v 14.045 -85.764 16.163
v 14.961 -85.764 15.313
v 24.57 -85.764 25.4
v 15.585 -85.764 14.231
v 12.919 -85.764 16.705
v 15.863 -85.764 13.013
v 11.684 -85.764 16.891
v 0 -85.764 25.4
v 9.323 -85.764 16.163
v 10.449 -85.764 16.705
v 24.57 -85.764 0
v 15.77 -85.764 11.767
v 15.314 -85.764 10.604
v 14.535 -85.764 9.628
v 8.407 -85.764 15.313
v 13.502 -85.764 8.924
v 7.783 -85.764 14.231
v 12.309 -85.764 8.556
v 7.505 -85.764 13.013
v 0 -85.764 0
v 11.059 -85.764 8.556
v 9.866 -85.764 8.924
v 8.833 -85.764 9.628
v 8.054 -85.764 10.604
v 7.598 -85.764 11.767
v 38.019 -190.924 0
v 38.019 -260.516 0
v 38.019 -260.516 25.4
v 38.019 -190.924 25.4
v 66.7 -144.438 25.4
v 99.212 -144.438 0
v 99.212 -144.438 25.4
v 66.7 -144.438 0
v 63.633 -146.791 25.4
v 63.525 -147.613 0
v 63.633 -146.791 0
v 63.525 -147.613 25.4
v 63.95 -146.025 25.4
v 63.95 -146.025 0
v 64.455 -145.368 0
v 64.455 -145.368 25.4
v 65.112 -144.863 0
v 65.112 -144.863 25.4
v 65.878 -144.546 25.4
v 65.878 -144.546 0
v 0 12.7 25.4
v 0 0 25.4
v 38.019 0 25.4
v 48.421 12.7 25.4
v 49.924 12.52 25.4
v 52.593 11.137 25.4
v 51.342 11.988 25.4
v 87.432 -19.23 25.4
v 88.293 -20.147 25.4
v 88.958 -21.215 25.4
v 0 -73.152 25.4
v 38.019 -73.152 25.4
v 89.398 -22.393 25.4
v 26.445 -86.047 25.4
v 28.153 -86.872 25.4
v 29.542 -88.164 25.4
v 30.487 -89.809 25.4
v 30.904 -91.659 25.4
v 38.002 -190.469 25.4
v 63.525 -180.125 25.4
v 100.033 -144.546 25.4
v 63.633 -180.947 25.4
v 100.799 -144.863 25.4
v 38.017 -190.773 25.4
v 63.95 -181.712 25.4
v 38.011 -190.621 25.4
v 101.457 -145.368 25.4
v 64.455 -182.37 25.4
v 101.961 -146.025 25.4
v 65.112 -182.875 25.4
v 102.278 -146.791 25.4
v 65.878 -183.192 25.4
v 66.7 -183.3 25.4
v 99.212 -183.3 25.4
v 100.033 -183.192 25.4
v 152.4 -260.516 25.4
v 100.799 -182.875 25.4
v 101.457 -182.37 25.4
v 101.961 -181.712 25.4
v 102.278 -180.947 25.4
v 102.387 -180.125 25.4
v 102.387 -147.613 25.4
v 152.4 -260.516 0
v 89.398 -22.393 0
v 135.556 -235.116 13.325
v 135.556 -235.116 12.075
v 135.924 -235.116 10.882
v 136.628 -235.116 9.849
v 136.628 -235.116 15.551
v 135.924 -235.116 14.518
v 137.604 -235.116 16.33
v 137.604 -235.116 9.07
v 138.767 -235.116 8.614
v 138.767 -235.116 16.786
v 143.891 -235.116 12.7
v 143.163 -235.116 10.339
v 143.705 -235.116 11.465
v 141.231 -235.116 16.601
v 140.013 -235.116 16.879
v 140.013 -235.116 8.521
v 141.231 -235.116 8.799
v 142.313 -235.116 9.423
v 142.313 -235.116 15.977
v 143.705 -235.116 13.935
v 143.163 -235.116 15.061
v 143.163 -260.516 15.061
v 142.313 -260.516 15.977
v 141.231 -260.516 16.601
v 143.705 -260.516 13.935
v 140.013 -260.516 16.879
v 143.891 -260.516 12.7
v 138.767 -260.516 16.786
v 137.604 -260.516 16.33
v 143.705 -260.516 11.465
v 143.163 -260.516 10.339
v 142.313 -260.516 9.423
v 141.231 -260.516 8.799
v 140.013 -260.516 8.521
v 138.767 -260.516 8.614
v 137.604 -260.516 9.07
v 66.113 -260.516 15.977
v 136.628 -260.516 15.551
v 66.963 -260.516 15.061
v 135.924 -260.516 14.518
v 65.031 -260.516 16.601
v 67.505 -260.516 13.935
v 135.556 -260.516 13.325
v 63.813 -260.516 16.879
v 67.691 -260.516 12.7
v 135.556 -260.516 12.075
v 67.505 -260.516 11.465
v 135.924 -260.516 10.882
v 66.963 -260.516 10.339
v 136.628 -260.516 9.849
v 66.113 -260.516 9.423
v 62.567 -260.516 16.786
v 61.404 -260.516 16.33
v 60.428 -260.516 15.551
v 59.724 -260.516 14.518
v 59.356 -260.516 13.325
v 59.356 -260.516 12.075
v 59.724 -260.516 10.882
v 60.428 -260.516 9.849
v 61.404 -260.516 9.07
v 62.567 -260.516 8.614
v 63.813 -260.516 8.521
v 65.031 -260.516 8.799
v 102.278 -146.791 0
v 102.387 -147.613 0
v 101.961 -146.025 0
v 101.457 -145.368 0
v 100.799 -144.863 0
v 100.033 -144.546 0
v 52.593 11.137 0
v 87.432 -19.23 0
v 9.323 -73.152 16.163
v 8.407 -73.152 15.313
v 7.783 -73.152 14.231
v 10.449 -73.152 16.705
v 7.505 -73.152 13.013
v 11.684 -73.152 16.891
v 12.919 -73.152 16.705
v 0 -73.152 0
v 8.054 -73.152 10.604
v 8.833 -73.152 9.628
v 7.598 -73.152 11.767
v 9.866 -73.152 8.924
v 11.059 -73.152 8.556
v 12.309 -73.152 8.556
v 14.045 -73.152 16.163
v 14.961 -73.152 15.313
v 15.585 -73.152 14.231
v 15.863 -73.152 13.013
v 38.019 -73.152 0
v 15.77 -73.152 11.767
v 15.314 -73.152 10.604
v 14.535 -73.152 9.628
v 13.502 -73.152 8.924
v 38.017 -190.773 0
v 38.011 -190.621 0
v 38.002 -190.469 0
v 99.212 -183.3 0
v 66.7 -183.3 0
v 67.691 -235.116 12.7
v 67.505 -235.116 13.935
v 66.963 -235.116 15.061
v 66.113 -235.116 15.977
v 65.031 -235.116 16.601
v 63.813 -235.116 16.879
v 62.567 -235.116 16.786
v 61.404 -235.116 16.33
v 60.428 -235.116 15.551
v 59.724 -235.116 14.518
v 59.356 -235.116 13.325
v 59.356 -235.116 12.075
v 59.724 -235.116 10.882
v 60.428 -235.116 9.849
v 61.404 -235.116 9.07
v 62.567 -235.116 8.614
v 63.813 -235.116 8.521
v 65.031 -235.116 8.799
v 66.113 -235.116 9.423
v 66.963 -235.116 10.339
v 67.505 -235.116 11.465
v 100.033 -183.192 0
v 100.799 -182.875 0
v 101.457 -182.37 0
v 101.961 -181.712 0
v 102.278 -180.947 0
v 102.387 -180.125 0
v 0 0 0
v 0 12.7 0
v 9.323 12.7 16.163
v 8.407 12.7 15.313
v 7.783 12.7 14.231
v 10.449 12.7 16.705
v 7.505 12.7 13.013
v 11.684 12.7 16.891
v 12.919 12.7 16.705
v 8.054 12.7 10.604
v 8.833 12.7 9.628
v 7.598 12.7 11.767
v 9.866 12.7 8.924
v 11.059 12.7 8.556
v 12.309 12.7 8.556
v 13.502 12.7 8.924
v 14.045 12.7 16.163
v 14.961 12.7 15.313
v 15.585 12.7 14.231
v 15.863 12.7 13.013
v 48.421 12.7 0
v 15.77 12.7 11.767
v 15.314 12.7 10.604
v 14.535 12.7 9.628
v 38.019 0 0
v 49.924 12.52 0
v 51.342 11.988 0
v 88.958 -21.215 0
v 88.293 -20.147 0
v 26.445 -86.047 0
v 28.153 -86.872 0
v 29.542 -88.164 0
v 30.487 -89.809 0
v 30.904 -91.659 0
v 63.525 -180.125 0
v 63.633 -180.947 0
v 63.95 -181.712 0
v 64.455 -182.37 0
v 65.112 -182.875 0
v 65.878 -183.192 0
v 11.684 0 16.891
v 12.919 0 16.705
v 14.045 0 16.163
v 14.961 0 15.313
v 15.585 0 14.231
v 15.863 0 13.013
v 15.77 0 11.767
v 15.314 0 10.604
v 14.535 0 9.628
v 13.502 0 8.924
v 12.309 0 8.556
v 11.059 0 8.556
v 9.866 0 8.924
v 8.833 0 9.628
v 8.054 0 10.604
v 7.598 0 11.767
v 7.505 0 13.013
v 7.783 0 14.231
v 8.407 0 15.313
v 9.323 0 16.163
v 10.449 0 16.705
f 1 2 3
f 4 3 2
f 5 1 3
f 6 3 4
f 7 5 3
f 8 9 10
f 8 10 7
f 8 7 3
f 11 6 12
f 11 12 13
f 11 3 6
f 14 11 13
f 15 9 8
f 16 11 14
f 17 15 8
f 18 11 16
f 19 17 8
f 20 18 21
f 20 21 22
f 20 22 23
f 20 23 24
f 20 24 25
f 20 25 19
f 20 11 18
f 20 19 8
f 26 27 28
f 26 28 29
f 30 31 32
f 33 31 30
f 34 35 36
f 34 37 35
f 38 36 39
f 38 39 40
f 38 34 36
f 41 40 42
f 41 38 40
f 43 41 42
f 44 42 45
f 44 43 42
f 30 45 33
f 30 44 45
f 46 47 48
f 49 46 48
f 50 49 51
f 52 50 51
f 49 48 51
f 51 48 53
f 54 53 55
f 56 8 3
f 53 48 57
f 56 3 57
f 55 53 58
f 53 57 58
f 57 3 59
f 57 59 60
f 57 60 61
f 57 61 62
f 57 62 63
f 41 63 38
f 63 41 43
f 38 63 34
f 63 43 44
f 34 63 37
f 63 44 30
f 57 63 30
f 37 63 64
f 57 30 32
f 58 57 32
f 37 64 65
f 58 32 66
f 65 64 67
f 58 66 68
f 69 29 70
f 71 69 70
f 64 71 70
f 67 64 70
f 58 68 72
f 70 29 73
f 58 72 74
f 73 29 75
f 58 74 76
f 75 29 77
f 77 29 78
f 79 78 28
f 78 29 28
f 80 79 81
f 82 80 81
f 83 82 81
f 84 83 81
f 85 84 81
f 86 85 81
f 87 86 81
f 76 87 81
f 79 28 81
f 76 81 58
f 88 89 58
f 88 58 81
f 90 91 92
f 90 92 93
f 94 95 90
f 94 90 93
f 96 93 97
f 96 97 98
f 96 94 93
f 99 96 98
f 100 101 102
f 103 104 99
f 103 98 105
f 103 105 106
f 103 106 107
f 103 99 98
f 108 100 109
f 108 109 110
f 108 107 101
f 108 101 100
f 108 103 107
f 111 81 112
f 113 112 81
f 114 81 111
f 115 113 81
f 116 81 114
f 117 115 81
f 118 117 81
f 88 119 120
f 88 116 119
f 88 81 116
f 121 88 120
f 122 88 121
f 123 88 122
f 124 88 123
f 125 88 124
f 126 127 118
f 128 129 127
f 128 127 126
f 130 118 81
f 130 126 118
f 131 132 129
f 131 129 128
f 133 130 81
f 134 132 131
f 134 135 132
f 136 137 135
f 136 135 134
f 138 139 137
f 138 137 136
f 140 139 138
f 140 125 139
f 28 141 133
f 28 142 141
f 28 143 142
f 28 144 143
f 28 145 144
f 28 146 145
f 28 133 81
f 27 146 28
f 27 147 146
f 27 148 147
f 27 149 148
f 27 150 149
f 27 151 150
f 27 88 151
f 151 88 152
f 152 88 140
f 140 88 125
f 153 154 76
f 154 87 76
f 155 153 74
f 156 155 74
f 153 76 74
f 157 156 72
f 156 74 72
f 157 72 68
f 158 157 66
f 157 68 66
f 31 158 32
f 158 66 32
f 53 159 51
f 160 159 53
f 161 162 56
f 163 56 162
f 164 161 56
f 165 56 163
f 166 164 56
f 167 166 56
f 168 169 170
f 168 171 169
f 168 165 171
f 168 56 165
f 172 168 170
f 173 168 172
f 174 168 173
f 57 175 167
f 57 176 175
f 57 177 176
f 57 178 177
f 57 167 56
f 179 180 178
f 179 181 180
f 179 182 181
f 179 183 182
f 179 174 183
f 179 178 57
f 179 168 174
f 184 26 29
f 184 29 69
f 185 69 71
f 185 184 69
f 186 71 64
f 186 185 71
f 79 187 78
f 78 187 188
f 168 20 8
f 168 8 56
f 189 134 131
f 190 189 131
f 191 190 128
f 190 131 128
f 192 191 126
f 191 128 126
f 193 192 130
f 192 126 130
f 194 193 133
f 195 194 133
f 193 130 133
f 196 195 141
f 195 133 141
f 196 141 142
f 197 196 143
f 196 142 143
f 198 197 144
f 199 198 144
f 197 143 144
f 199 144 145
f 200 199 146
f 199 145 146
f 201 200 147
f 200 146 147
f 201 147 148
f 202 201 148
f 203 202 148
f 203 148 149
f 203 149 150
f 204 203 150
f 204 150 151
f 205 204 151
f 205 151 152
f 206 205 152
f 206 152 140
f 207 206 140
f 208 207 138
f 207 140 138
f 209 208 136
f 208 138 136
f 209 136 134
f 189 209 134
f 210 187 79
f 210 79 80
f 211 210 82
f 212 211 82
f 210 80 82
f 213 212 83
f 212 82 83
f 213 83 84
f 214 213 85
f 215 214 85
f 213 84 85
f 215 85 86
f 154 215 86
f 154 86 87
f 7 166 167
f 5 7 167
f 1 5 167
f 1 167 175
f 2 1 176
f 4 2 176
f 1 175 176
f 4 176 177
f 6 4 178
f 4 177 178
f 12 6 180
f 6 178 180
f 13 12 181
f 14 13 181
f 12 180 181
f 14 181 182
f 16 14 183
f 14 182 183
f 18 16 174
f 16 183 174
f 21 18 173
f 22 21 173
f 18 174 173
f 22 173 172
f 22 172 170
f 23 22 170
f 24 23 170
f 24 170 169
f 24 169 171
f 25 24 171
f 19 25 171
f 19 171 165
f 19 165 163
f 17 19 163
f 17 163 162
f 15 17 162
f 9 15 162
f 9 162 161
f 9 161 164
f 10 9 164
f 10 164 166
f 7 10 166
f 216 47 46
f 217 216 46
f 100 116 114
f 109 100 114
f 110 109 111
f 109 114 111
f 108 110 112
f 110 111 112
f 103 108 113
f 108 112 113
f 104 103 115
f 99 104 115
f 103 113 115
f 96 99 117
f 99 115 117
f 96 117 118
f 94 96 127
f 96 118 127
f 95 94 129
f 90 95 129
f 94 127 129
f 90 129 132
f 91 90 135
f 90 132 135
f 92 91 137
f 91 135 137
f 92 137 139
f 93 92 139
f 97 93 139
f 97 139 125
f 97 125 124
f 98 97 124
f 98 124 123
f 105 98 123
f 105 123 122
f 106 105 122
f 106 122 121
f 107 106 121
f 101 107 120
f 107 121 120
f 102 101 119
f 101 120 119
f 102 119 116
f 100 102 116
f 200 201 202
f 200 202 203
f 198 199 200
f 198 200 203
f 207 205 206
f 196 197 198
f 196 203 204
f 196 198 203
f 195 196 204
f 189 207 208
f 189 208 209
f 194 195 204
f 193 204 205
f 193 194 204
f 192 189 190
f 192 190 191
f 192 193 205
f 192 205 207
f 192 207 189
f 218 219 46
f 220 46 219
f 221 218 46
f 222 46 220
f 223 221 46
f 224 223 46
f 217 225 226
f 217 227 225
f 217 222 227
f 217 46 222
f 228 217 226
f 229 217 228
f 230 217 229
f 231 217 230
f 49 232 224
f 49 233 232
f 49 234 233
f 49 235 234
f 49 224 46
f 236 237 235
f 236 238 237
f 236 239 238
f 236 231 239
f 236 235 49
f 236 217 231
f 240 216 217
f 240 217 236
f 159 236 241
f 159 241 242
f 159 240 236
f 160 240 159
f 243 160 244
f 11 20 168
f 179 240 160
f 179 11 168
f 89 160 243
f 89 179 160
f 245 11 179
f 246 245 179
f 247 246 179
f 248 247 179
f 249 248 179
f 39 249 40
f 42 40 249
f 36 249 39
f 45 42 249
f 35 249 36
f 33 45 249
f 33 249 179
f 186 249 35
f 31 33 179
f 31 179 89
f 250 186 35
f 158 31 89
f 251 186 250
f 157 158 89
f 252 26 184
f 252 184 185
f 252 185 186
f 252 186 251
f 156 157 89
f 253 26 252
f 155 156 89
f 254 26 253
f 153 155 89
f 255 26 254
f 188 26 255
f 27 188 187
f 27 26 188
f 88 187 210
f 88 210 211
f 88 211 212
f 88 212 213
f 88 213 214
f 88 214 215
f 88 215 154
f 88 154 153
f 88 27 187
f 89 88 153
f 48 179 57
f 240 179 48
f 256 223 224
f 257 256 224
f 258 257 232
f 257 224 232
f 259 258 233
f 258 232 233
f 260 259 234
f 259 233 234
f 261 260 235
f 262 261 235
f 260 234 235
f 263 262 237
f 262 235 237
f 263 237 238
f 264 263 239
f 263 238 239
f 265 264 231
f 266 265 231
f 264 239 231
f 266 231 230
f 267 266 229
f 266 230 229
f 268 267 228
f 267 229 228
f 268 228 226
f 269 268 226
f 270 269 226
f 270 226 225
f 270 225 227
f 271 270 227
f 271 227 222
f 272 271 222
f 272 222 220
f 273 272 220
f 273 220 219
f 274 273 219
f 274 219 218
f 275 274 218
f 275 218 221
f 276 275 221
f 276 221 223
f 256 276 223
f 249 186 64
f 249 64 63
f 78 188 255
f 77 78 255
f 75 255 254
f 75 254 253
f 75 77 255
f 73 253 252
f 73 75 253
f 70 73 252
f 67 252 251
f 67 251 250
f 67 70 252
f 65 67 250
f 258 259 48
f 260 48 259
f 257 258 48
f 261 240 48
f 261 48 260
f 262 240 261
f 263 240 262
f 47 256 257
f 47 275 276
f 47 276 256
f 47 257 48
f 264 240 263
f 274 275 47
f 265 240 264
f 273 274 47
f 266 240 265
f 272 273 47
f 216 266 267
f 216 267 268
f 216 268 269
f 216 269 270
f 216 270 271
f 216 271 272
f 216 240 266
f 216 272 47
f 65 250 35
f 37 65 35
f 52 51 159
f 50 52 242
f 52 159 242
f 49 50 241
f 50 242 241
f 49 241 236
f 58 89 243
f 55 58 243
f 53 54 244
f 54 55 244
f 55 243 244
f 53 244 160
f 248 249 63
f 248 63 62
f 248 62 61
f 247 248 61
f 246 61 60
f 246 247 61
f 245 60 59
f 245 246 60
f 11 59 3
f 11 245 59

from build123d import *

# Parameters (mm, degrees)
BOSS_EXTRUDE1_DEPTH = 25.4
SKETCH2_W           = 38.862
SKETCH2_H           = 38.862
CUT_EXTRUDE1_DEPTH  = 303.885239179
FILLET1_R           = 6.35
FILLET2_R           = 3.175
SKETCH3_R           = 4.191
CUT_EXTRUDE2_DEPTH  = 314.875552812
SKETCH4_R           = 4.191
CUT_EXTRUDE3_DEPTH  = 25.4


with BuildPart() as part:
    # Sketch1 → Boss-Extrude1 (new body)
    with BuildSketch(Plane.XY):
        Polygon((0, 0), (0, 12.7), (50.8, 12.7), (88.9, -20.510228633), (152.4, -260.515926793), (38.018659419, -260.515926793), (38.018659419, -190.696503564), (30.48, -85.763926793), (0, -85.763926793), (0, -73.152260366), (38.018659419, -73.152260366), (38.018659419, 0), align=None)
    extrude(amount=BOSS_EXTRUDE1_DEPTH)

    # Sketch2 → Cut-Extrude1 (cut, through all)
    with BuildSketch(Plane(origin=(0, 0, 0), x_dir=(-1, 0, 0), z_dir=(0, 0, -1))):
        with Locations((-82.955564704, -163.868926793)):
            Rectangle(SKETCH2_W, SKETCH2_H)
    extrude(amount=-CUT_EXTRUDE1_DEPTH, mode=Mode.SUBTRACT)

    # Fillet1
    # the kernel refuses this fillet: 6.35 mm, written as the material it adds along each edge
    with BuildSketch(Plane(origin=(38.018659419, -190.696503564, 0), x_dir=(0, -1, 0), z_dir=(0, 0, 1))) as fillet1_piece_1:
        with BuildLine():
            CenterArc((FILLET1_R * 0.0358752122725, -FILLET1_R), FILLET1_R, 90, 4.109234206)
            Line((-FILLET1_R * 0.0357829859603, -FILLET1_R * 0.00257075307266), (0, 0))
            Line((0, 0), (FILLET1_R * 0.0358752122725, 0))
        make_face()
    extrude(amount=25.4)
    with BuildSketch(Plane(origin=(30.48, -85.763926793, 0), x_dir=(-1, 0, 0), z_dir=(0, 0, 1))) as fillet1_piece_2:
        with BuildLine():
            CenterArc((FILLET1_R * 0.930734490318, FILLET1_R), FILLET1_R, 184.109234206, 85.890765794)
            Line((-FILLET1_R * 0.0666947566093, FILLET1_R * 0.928341801767), (0, 0))
            Line((0, 0), (FILLET1_R * 0.930734490318, 0))
        make_face()
    extrude(amount=25.4)
    # the kernel refuses this fillet: 6.35 mm, written as the material it takes off along each edge
    with BuildSketch(Plane(origin=(50.8, 12.7, -5.947635314), x_dir=(-1, 0, 0), z_dir=(0, 0, 1))) as fillet1_2_piece_1:
        with BuildLine():
            CenterArc((FILLET1_R * 0.374654193004, FILLET1_R), FILLET1_R, 228.922654606, 41.077345394)
            Line((-FILLET1_R * 0.282423044355, FILLET1_R * 0.246176742103), (0, 0))
            Line((0, 0), (FILLET1_R * 0.374654193004, 0))
        make_face()
    extrude(amount=37.295270628, mode=Mode.SUBTRACT)
    with BuildSketch(Plane(origin=(88.9, -20.510228633, -4.869092834), x_dir=(-0.7538232578965339, 0.6570772373581782, 0), z_dir=(0, 0, 1))) as fillet1_2_piece_2:
        with BuildLine():
            CenterArc((FILLET1_R * 0.306714509228, FILLET1_R), FILLET1_R, 235.896927034, 34.103072966)
            Line((-FILLET1_R * 0.253968896194, FILLET1_R * 0.171969735526), (0, 0))
            Line((0, 0), (FILLET1_R * 0.306714509228, 0))
        make_face()
    extrude(amount=35.138185668, mode=Mode.SUBTRACT)

    # Fillet2
    fillet2_edges = [part.edges().sort_by_distance(p)[0] for p in [
        (63.524564704, -144.437926793, 12.7),
        (63.524564704, -183.299926793, 12.7),
        (102.386564704, -183.299926793, 12.7),
        (102.386564704, -144.437926793, 12.7),
    ]]
    fillet(fillet2_edges, radius=FILLET2_R)

    # Sketch3 → Cut-Extrude2 (cut, through all)
    with BuildSketch(Plane(origin=(0, 12.7, 0), x_dir=(1, 0, 0), z_dir=(0, 1, 0))):
        with Locations(Location((11.684, -12.7, 0), (0, 0, 270))):
            Circle(SKETCH3_R)
    extrude(amount=-CUT_EXTRUDE2_DEPTH, mode=Mode.SUBTRACT)

    # Sketch4 → Cut-Extrude3 (cut)
    with BuildSketch(Plane.XZ.offset(260.515926793)):
        with Locations((139.7, 12.7)):
            Circle(SKETCH4_R)
        with Locations((63.5, 12.7)):
            Circle(SKETCH4_R)
    extrude(amount=-CUT_EXTRUDE3_DEPTH, mode=Mode.SUBTRACT)


solid = part.part
